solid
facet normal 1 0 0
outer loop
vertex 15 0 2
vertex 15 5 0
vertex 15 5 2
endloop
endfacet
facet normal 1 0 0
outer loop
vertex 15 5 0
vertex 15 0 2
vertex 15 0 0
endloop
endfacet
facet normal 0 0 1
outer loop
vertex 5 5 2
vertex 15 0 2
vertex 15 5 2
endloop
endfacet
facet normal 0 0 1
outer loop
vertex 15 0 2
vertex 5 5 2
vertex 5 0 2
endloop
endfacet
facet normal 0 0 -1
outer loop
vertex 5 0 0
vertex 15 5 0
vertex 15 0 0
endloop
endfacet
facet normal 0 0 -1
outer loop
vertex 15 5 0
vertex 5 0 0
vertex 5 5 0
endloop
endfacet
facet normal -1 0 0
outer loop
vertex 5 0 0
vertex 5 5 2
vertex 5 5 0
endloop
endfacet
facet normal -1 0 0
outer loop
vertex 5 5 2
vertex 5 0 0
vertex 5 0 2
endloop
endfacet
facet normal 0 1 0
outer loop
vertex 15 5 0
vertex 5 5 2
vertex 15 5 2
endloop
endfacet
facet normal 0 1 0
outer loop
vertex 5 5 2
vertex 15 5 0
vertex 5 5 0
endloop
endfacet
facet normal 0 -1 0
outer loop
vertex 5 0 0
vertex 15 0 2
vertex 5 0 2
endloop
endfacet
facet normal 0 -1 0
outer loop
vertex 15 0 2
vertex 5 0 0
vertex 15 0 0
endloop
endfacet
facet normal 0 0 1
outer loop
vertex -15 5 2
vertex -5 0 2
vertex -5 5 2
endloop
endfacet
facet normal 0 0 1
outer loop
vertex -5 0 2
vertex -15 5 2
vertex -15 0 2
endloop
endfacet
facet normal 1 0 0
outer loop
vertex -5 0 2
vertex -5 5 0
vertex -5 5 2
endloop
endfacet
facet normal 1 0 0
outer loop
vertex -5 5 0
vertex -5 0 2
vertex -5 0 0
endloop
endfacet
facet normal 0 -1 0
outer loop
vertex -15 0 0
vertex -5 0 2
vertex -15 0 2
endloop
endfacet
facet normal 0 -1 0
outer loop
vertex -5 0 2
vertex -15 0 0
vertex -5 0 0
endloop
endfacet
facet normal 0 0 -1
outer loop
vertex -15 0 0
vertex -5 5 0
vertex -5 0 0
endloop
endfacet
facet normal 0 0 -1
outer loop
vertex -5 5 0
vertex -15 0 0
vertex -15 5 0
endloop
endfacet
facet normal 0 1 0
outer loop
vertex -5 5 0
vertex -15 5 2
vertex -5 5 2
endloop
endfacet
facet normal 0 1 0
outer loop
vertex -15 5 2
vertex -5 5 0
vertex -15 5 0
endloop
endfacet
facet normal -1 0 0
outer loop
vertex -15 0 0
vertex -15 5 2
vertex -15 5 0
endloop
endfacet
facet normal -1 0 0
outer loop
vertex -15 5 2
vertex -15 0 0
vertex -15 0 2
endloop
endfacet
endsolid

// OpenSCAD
// Generated by scadwright. Do not hand-edit —
// edit the Python source and regenerate.

union() {
    translate([5, 0, 0]) {
        cube([10, 5, 2], center=false);
    }

    mirror([1, 0, 0]) {
        translate([5, 0, 0]) {
            cube([10, 5, 2], center=false);
        }
    }
}
